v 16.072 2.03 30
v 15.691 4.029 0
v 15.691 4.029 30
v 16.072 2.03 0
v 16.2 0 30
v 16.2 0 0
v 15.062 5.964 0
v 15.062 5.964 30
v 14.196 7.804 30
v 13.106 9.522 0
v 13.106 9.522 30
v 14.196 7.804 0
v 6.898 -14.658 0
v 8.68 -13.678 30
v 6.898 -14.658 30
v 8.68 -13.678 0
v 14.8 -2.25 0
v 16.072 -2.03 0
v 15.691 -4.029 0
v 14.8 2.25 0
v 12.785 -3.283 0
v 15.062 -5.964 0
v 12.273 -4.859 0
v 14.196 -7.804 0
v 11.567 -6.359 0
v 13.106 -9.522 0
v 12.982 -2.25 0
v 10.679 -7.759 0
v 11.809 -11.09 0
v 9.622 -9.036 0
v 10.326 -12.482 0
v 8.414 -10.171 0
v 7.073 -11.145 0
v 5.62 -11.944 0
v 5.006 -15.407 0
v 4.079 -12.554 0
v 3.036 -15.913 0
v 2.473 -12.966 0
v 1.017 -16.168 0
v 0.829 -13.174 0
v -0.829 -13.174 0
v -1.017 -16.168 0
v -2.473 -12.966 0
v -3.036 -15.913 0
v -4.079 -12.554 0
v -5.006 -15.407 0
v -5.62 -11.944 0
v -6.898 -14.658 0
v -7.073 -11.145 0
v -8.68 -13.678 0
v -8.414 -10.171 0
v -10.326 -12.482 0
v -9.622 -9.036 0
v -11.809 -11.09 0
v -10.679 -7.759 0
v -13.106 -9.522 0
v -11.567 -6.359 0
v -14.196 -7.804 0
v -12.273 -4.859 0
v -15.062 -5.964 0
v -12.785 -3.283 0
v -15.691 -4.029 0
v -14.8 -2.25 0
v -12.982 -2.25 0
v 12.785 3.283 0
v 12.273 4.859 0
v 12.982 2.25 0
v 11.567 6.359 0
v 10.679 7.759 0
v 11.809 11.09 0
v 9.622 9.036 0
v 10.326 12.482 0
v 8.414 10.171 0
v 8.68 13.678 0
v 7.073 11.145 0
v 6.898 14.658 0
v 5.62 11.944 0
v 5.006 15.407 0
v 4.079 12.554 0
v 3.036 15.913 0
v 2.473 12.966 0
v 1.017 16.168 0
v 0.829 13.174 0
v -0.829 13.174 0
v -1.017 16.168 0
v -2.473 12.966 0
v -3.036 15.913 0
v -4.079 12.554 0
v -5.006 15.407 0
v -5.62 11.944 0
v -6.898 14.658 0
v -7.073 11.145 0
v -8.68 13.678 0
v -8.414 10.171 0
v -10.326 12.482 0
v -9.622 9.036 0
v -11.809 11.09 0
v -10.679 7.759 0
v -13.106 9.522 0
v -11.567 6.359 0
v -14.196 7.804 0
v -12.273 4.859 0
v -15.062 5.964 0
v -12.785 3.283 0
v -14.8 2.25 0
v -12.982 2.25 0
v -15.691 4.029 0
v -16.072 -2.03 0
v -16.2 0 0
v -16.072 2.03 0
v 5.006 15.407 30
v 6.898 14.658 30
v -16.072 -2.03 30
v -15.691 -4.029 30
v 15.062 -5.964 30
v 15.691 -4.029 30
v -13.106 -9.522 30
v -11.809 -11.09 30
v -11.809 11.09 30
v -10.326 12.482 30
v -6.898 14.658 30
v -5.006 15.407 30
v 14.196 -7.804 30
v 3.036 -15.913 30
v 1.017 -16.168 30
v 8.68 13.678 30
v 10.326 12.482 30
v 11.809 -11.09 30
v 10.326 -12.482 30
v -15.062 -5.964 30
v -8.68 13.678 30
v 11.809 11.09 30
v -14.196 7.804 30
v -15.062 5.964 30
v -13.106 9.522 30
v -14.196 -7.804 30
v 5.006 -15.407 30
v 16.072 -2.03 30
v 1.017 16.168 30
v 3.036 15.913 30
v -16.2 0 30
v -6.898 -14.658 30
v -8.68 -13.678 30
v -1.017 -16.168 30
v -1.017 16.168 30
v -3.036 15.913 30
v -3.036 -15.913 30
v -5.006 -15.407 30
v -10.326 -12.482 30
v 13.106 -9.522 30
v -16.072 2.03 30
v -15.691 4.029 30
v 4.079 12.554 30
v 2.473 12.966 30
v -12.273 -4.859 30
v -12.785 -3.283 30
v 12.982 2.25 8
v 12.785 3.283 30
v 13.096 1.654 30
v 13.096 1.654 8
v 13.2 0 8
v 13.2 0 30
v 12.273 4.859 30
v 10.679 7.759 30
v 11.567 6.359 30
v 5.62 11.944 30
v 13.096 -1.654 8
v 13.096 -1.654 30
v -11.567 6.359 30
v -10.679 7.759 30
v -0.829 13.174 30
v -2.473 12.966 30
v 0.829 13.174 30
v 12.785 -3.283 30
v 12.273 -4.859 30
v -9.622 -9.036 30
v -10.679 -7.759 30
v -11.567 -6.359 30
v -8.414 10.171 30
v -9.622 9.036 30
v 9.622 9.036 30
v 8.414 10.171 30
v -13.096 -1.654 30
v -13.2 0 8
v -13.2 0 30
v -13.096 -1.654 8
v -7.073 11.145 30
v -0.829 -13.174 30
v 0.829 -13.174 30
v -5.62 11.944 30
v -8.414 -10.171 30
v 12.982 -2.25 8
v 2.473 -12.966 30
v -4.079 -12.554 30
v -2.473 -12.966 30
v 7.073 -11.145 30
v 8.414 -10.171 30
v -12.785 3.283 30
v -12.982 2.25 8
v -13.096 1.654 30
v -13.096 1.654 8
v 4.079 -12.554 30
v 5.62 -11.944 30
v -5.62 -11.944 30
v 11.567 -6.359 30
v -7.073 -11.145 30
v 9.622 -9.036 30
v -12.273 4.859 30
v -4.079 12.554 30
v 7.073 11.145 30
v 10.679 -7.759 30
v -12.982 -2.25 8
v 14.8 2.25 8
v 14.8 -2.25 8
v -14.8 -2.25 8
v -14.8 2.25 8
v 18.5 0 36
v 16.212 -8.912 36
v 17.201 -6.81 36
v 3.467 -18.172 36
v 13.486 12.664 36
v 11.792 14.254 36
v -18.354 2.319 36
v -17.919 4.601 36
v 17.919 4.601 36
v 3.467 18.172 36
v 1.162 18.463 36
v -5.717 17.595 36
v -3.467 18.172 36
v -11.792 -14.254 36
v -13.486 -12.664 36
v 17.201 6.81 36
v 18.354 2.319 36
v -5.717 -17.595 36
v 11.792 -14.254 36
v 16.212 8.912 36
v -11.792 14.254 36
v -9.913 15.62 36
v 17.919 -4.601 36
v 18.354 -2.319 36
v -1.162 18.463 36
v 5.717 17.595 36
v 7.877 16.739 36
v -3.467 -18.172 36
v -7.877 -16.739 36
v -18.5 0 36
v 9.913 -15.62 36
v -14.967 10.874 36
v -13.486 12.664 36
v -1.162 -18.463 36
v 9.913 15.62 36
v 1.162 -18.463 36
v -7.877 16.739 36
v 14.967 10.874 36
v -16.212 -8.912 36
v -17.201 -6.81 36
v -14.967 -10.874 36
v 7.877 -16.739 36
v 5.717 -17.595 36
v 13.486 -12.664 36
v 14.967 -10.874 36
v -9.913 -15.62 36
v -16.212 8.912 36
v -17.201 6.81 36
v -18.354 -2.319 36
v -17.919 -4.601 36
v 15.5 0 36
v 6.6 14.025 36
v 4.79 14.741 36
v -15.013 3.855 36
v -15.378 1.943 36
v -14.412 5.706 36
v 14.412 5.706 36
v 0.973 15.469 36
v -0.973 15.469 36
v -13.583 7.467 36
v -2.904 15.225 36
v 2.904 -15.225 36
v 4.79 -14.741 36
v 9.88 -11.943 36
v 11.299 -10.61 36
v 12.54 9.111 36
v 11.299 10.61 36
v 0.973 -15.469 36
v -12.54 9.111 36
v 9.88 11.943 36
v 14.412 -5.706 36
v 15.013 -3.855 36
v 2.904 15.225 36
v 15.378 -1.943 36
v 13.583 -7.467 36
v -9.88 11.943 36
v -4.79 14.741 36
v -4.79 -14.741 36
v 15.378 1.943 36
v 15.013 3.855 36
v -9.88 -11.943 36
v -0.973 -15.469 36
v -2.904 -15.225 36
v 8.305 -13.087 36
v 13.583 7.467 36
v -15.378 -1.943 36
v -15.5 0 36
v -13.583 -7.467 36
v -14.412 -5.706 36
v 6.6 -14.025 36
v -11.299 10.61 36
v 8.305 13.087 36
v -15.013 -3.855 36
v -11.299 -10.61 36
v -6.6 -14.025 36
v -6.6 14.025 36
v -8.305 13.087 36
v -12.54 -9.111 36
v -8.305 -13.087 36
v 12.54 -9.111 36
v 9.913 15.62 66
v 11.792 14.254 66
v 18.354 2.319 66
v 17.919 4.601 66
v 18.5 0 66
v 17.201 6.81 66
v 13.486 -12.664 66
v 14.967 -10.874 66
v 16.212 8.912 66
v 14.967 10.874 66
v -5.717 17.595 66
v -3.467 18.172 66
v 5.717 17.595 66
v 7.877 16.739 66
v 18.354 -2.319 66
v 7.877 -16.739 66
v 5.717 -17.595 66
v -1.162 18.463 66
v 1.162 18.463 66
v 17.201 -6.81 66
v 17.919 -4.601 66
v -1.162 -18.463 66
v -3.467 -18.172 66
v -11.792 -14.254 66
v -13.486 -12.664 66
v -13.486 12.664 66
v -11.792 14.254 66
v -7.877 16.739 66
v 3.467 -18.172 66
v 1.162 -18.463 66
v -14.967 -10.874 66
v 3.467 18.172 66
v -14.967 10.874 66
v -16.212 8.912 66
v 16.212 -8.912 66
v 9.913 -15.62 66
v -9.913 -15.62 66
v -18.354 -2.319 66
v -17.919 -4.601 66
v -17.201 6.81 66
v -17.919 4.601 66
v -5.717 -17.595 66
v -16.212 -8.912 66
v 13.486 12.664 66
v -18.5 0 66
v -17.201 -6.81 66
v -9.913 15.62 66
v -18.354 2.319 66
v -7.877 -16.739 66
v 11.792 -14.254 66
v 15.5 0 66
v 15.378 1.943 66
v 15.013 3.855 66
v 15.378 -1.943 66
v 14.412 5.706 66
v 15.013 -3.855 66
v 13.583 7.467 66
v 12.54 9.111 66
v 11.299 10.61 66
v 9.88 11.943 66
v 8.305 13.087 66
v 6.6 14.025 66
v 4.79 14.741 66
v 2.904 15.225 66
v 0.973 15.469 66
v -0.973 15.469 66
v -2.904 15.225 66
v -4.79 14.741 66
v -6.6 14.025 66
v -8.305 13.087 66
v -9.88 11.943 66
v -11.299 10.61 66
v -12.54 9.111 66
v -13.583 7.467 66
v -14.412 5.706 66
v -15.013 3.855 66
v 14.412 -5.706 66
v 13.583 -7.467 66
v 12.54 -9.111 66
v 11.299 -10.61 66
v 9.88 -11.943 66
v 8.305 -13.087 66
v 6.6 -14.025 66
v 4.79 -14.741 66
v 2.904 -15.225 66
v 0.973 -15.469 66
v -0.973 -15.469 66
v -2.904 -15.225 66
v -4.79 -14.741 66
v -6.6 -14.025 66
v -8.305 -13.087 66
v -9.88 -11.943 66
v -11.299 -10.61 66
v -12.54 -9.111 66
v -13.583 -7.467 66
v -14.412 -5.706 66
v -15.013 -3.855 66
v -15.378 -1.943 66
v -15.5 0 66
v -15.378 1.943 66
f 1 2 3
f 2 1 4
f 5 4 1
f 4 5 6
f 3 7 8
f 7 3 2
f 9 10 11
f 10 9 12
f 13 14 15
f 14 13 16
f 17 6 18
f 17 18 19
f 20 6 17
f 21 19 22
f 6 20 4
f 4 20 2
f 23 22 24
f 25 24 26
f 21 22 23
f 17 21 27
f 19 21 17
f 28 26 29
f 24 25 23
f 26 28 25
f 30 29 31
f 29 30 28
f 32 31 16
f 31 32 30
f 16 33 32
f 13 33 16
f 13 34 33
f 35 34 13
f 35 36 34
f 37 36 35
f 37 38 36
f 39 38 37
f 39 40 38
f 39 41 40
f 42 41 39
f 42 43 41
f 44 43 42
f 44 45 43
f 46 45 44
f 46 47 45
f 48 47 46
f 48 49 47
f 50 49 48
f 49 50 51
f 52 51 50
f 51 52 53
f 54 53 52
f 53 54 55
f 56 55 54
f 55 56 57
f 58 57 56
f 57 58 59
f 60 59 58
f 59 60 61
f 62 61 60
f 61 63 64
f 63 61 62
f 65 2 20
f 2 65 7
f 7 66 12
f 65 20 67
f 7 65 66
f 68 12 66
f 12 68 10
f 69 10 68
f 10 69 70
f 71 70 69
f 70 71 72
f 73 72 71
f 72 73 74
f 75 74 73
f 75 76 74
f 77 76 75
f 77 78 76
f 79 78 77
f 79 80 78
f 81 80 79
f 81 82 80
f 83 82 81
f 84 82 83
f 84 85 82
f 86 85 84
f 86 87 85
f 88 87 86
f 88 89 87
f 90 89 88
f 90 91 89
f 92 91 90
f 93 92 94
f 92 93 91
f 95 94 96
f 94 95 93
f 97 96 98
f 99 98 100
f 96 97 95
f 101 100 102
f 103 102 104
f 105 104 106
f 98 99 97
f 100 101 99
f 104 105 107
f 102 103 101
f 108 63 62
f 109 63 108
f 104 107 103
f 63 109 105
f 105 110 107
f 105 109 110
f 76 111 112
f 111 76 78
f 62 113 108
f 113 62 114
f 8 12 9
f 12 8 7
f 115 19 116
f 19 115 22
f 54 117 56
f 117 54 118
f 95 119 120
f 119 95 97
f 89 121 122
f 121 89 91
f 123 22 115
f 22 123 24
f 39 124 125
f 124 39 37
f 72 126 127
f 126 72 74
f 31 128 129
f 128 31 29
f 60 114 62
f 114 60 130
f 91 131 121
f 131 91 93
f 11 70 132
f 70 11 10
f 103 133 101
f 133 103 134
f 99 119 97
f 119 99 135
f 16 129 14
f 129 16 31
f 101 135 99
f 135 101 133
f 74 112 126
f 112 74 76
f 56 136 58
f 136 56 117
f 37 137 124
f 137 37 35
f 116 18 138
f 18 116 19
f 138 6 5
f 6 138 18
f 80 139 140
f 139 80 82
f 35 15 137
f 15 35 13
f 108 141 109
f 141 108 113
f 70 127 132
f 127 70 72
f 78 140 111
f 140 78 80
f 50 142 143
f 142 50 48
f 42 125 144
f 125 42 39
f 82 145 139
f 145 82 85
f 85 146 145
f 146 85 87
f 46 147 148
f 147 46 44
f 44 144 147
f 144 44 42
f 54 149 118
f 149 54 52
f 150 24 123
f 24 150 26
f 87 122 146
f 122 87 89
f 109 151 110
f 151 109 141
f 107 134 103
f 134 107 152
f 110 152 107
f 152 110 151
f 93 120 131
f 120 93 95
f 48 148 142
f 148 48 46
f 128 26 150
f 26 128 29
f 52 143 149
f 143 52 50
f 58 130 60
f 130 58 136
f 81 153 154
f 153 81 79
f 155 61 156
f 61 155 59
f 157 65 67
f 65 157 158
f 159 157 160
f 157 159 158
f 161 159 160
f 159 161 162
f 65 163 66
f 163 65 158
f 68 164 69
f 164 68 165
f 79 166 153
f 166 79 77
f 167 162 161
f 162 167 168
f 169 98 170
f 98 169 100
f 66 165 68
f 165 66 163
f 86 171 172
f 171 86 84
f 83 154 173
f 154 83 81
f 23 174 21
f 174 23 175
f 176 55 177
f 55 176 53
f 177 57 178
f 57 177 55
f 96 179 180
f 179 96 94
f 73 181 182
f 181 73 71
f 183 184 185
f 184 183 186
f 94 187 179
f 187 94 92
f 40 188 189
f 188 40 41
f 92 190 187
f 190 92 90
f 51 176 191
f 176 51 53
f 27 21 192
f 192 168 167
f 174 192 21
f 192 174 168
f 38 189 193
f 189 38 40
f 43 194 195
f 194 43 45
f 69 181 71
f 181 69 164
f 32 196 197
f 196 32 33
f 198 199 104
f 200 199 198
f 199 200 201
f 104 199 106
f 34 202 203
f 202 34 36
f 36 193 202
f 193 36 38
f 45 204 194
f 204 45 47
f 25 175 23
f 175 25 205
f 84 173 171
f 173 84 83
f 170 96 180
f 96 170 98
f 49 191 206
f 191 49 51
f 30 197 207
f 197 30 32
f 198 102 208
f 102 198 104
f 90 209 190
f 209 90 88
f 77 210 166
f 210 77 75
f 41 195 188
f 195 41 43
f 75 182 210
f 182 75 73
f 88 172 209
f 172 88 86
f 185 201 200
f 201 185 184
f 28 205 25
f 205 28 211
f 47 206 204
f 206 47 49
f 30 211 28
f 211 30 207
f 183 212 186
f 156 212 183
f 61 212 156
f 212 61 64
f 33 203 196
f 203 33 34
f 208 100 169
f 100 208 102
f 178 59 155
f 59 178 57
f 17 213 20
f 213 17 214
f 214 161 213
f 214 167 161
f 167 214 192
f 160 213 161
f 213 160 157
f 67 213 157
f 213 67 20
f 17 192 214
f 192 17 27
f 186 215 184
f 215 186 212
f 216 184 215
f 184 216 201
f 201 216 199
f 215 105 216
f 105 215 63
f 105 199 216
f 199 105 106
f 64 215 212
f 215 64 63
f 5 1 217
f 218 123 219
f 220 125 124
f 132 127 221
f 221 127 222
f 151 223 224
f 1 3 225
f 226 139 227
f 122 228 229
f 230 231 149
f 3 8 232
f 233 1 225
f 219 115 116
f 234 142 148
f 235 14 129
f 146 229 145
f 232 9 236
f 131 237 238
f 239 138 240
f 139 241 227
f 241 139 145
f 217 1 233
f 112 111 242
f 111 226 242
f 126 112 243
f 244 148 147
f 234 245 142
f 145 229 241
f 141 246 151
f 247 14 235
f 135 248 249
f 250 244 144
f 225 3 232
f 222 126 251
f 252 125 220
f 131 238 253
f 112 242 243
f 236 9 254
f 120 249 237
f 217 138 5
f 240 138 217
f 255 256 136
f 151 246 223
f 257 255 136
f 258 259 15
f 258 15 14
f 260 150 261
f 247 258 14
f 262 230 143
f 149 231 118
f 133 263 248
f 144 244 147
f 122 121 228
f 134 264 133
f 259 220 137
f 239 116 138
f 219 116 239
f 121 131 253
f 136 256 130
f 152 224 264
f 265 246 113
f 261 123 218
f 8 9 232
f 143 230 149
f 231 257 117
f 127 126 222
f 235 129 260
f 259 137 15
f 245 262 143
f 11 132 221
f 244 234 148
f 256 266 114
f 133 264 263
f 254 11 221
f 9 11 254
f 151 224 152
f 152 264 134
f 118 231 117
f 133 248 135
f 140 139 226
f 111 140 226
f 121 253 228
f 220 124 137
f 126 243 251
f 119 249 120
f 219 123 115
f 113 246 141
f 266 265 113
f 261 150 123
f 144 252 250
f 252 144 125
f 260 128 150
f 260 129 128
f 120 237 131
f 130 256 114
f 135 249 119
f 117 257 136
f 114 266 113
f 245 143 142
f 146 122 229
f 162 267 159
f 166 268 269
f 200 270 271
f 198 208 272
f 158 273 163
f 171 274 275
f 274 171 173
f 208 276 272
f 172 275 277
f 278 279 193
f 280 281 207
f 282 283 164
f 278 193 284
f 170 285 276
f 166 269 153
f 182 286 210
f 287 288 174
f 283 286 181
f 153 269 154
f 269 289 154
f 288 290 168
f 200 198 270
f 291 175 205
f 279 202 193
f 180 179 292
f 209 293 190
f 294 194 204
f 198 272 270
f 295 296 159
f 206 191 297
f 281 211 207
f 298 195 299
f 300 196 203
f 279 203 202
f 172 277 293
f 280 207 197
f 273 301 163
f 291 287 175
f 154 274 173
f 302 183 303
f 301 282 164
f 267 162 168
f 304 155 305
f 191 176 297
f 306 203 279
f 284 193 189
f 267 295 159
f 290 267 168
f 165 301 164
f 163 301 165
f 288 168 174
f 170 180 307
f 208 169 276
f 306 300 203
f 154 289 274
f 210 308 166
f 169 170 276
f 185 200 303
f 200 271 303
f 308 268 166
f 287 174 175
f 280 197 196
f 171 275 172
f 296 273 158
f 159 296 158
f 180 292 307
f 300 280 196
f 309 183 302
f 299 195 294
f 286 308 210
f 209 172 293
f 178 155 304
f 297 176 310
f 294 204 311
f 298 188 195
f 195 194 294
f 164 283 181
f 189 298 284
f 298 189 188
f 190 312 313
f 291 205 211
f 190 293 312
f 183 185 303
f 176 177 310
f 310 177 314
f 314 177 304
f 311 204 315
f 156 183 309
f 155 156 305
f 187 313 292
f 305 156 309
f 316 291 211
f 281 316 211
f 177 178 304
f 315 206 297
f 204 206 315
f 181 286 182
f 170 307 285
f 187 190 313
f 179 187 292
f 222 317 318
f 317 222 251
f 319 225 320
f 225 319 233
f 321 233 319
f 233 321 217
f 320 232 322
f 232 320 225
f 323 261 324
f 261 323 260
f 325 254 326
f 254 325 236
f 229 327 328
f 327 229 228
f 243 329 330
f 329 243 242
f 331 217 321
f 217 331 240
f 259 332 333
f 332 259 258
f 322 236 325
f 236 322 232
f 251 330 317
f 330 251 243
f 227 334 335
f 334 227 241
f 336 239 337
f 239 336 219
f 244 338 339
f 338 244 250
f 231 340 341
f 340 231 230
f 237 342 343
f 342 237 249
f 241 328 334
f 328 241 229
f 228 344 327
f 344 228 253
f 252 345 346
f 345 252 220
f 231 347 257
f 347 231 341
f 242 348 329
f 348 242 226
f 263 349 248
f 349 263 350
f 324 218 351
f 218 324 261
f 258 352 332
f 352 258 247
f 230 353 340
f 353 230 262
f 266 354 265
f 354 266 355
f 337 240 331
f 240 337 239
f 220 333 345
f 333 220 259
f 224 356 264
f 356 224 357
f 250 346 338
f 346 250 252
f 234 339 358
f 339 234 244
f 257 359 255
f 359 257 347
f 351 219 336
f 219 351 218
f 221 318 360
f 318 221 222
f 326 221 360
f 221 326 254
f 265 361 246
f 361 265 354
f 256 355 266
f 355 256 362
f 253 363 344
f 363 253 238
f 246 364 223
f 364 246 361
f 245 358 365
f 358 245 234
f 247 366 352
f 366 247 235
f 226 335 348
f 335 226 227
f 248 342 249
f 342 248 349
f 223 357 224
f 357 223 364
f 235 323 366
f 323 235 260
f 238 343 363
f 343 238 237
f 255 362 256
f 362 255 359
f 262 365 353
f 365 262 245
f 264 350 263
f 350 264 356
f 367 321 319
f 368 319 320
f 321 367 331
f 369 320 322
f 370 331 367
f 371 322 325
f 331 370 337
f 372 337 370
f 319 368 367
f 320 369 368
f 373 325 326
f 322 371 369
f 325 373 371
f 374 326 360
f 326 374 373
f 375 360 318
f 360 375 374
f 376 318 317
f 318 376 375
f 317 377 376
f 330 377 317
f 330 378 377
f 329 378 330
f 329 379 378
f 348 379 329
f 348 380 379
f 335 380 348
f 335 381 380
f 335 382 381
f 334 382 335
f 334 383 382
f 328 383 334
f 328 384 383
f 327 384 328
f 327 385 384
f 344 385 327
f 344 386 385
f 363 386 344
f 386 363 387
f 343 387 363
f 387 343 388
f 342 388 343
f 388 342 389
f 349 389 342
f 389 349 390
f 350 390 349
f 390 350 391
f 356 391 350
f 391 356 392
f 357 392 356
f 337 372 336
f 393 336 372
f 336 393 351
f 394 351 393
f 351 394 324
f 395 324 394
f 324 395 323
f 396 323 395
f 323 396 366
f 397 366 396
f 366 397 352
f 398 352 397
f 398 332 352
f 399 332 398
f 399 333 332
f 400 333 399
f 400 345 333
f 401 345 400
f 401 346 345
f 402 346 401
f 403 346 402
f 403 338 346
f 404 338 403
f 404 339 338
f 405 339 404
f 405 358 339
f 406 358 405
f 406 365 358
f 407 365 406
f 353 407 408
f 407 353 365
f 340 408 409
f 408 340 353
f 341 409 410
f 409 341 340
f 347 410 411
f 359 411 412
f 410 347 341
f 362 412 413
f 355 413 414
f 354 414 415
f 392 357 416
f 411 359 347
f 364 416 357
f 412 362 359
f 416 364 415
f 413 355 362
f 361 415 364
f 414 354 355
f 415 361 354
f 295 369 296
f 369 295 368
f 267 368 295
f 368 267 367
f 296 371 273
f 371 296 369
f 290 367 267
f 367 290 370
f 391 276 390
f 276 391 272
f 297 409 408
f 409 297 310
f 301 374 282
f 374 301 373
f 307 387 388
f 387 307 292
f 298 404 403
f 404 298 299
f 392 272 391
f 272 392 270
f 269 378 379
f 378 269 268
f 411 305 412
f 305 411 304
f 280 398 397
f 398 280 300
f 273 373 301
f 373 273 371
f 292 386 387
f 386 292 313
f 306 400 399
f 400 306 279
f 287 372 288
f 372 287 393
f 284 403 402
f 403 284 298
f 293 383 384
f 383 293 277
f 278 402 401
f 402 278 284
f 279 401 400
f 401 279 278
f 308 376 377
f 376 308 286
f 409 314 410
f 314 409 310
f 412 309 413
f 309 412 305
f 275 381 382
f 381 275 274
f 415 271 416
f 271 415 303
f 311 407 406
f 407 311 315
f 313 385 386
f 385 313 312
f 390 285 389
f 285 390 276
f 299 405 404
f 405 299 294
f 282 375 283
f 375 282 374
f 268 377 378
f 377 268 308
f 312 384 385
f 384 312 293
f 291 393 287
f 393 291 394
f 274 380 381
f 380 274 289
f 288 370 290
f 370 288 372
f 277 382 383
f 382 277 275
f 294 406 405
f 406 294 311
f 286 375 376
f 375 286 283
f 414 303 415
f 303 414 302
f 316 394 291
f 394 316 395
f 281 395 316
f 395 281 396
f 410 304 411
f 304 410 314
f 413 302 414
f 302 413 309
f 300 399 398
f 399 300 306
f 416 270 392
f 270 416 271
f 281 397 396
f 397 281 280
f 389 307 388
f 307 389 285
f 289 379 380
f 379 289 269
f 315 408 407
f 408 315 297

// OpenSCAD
tool_inner_diameter=26.4;
wall_thickness=3;
extrusion_thickness=1.6;
extrusion_width=4.5;
extrusion_height=8;
overshoot=1;
tool_height=30;
connection_height=6;
adapter_height=30;
adapter_inner_diameter=31;

$fn=50;

difference(){
  cylinder(h=tool_height,r=tool_inner_diameter/2+wall_thickness);
  cylinder(h=tool_height+overshoot,r=tool_inner_diameter/2);
  translate([tool_inner_diameter/2-overshoot,extrusion_width/2*-1,0])
    cube([extrusion_thickness+overshoot,extrusion_width,extrusion_height]);
  translate([(tool_inner_diameter/2+extrusion_thickness)*-1,extrusion_width/2*-1,0])
    cube([extrusion_thickness+overshoot,extrusion_width,extrusion_height]);
}

translate([0,0,tool_height]){
  difference(){
    cylinder(h=connection_height,r1=tool_inner_diameter/2+wall_thickness,r2=adapter_inner_diameter/2+wall_thickness);
    cylinder(h=connection_height,r1=tool_inner_diameter/2,r2=adapter_inner_diameter/2);
  }
}


translate([0,0,tool_height+connection_height]){
  difference(){
    cylinder(h=adapter_height,r=adapter_inner_diameter/2+wall_thickness);
    cylinder(h=adapter_height,r=adapter_inner_diameter/2);
  }
}
